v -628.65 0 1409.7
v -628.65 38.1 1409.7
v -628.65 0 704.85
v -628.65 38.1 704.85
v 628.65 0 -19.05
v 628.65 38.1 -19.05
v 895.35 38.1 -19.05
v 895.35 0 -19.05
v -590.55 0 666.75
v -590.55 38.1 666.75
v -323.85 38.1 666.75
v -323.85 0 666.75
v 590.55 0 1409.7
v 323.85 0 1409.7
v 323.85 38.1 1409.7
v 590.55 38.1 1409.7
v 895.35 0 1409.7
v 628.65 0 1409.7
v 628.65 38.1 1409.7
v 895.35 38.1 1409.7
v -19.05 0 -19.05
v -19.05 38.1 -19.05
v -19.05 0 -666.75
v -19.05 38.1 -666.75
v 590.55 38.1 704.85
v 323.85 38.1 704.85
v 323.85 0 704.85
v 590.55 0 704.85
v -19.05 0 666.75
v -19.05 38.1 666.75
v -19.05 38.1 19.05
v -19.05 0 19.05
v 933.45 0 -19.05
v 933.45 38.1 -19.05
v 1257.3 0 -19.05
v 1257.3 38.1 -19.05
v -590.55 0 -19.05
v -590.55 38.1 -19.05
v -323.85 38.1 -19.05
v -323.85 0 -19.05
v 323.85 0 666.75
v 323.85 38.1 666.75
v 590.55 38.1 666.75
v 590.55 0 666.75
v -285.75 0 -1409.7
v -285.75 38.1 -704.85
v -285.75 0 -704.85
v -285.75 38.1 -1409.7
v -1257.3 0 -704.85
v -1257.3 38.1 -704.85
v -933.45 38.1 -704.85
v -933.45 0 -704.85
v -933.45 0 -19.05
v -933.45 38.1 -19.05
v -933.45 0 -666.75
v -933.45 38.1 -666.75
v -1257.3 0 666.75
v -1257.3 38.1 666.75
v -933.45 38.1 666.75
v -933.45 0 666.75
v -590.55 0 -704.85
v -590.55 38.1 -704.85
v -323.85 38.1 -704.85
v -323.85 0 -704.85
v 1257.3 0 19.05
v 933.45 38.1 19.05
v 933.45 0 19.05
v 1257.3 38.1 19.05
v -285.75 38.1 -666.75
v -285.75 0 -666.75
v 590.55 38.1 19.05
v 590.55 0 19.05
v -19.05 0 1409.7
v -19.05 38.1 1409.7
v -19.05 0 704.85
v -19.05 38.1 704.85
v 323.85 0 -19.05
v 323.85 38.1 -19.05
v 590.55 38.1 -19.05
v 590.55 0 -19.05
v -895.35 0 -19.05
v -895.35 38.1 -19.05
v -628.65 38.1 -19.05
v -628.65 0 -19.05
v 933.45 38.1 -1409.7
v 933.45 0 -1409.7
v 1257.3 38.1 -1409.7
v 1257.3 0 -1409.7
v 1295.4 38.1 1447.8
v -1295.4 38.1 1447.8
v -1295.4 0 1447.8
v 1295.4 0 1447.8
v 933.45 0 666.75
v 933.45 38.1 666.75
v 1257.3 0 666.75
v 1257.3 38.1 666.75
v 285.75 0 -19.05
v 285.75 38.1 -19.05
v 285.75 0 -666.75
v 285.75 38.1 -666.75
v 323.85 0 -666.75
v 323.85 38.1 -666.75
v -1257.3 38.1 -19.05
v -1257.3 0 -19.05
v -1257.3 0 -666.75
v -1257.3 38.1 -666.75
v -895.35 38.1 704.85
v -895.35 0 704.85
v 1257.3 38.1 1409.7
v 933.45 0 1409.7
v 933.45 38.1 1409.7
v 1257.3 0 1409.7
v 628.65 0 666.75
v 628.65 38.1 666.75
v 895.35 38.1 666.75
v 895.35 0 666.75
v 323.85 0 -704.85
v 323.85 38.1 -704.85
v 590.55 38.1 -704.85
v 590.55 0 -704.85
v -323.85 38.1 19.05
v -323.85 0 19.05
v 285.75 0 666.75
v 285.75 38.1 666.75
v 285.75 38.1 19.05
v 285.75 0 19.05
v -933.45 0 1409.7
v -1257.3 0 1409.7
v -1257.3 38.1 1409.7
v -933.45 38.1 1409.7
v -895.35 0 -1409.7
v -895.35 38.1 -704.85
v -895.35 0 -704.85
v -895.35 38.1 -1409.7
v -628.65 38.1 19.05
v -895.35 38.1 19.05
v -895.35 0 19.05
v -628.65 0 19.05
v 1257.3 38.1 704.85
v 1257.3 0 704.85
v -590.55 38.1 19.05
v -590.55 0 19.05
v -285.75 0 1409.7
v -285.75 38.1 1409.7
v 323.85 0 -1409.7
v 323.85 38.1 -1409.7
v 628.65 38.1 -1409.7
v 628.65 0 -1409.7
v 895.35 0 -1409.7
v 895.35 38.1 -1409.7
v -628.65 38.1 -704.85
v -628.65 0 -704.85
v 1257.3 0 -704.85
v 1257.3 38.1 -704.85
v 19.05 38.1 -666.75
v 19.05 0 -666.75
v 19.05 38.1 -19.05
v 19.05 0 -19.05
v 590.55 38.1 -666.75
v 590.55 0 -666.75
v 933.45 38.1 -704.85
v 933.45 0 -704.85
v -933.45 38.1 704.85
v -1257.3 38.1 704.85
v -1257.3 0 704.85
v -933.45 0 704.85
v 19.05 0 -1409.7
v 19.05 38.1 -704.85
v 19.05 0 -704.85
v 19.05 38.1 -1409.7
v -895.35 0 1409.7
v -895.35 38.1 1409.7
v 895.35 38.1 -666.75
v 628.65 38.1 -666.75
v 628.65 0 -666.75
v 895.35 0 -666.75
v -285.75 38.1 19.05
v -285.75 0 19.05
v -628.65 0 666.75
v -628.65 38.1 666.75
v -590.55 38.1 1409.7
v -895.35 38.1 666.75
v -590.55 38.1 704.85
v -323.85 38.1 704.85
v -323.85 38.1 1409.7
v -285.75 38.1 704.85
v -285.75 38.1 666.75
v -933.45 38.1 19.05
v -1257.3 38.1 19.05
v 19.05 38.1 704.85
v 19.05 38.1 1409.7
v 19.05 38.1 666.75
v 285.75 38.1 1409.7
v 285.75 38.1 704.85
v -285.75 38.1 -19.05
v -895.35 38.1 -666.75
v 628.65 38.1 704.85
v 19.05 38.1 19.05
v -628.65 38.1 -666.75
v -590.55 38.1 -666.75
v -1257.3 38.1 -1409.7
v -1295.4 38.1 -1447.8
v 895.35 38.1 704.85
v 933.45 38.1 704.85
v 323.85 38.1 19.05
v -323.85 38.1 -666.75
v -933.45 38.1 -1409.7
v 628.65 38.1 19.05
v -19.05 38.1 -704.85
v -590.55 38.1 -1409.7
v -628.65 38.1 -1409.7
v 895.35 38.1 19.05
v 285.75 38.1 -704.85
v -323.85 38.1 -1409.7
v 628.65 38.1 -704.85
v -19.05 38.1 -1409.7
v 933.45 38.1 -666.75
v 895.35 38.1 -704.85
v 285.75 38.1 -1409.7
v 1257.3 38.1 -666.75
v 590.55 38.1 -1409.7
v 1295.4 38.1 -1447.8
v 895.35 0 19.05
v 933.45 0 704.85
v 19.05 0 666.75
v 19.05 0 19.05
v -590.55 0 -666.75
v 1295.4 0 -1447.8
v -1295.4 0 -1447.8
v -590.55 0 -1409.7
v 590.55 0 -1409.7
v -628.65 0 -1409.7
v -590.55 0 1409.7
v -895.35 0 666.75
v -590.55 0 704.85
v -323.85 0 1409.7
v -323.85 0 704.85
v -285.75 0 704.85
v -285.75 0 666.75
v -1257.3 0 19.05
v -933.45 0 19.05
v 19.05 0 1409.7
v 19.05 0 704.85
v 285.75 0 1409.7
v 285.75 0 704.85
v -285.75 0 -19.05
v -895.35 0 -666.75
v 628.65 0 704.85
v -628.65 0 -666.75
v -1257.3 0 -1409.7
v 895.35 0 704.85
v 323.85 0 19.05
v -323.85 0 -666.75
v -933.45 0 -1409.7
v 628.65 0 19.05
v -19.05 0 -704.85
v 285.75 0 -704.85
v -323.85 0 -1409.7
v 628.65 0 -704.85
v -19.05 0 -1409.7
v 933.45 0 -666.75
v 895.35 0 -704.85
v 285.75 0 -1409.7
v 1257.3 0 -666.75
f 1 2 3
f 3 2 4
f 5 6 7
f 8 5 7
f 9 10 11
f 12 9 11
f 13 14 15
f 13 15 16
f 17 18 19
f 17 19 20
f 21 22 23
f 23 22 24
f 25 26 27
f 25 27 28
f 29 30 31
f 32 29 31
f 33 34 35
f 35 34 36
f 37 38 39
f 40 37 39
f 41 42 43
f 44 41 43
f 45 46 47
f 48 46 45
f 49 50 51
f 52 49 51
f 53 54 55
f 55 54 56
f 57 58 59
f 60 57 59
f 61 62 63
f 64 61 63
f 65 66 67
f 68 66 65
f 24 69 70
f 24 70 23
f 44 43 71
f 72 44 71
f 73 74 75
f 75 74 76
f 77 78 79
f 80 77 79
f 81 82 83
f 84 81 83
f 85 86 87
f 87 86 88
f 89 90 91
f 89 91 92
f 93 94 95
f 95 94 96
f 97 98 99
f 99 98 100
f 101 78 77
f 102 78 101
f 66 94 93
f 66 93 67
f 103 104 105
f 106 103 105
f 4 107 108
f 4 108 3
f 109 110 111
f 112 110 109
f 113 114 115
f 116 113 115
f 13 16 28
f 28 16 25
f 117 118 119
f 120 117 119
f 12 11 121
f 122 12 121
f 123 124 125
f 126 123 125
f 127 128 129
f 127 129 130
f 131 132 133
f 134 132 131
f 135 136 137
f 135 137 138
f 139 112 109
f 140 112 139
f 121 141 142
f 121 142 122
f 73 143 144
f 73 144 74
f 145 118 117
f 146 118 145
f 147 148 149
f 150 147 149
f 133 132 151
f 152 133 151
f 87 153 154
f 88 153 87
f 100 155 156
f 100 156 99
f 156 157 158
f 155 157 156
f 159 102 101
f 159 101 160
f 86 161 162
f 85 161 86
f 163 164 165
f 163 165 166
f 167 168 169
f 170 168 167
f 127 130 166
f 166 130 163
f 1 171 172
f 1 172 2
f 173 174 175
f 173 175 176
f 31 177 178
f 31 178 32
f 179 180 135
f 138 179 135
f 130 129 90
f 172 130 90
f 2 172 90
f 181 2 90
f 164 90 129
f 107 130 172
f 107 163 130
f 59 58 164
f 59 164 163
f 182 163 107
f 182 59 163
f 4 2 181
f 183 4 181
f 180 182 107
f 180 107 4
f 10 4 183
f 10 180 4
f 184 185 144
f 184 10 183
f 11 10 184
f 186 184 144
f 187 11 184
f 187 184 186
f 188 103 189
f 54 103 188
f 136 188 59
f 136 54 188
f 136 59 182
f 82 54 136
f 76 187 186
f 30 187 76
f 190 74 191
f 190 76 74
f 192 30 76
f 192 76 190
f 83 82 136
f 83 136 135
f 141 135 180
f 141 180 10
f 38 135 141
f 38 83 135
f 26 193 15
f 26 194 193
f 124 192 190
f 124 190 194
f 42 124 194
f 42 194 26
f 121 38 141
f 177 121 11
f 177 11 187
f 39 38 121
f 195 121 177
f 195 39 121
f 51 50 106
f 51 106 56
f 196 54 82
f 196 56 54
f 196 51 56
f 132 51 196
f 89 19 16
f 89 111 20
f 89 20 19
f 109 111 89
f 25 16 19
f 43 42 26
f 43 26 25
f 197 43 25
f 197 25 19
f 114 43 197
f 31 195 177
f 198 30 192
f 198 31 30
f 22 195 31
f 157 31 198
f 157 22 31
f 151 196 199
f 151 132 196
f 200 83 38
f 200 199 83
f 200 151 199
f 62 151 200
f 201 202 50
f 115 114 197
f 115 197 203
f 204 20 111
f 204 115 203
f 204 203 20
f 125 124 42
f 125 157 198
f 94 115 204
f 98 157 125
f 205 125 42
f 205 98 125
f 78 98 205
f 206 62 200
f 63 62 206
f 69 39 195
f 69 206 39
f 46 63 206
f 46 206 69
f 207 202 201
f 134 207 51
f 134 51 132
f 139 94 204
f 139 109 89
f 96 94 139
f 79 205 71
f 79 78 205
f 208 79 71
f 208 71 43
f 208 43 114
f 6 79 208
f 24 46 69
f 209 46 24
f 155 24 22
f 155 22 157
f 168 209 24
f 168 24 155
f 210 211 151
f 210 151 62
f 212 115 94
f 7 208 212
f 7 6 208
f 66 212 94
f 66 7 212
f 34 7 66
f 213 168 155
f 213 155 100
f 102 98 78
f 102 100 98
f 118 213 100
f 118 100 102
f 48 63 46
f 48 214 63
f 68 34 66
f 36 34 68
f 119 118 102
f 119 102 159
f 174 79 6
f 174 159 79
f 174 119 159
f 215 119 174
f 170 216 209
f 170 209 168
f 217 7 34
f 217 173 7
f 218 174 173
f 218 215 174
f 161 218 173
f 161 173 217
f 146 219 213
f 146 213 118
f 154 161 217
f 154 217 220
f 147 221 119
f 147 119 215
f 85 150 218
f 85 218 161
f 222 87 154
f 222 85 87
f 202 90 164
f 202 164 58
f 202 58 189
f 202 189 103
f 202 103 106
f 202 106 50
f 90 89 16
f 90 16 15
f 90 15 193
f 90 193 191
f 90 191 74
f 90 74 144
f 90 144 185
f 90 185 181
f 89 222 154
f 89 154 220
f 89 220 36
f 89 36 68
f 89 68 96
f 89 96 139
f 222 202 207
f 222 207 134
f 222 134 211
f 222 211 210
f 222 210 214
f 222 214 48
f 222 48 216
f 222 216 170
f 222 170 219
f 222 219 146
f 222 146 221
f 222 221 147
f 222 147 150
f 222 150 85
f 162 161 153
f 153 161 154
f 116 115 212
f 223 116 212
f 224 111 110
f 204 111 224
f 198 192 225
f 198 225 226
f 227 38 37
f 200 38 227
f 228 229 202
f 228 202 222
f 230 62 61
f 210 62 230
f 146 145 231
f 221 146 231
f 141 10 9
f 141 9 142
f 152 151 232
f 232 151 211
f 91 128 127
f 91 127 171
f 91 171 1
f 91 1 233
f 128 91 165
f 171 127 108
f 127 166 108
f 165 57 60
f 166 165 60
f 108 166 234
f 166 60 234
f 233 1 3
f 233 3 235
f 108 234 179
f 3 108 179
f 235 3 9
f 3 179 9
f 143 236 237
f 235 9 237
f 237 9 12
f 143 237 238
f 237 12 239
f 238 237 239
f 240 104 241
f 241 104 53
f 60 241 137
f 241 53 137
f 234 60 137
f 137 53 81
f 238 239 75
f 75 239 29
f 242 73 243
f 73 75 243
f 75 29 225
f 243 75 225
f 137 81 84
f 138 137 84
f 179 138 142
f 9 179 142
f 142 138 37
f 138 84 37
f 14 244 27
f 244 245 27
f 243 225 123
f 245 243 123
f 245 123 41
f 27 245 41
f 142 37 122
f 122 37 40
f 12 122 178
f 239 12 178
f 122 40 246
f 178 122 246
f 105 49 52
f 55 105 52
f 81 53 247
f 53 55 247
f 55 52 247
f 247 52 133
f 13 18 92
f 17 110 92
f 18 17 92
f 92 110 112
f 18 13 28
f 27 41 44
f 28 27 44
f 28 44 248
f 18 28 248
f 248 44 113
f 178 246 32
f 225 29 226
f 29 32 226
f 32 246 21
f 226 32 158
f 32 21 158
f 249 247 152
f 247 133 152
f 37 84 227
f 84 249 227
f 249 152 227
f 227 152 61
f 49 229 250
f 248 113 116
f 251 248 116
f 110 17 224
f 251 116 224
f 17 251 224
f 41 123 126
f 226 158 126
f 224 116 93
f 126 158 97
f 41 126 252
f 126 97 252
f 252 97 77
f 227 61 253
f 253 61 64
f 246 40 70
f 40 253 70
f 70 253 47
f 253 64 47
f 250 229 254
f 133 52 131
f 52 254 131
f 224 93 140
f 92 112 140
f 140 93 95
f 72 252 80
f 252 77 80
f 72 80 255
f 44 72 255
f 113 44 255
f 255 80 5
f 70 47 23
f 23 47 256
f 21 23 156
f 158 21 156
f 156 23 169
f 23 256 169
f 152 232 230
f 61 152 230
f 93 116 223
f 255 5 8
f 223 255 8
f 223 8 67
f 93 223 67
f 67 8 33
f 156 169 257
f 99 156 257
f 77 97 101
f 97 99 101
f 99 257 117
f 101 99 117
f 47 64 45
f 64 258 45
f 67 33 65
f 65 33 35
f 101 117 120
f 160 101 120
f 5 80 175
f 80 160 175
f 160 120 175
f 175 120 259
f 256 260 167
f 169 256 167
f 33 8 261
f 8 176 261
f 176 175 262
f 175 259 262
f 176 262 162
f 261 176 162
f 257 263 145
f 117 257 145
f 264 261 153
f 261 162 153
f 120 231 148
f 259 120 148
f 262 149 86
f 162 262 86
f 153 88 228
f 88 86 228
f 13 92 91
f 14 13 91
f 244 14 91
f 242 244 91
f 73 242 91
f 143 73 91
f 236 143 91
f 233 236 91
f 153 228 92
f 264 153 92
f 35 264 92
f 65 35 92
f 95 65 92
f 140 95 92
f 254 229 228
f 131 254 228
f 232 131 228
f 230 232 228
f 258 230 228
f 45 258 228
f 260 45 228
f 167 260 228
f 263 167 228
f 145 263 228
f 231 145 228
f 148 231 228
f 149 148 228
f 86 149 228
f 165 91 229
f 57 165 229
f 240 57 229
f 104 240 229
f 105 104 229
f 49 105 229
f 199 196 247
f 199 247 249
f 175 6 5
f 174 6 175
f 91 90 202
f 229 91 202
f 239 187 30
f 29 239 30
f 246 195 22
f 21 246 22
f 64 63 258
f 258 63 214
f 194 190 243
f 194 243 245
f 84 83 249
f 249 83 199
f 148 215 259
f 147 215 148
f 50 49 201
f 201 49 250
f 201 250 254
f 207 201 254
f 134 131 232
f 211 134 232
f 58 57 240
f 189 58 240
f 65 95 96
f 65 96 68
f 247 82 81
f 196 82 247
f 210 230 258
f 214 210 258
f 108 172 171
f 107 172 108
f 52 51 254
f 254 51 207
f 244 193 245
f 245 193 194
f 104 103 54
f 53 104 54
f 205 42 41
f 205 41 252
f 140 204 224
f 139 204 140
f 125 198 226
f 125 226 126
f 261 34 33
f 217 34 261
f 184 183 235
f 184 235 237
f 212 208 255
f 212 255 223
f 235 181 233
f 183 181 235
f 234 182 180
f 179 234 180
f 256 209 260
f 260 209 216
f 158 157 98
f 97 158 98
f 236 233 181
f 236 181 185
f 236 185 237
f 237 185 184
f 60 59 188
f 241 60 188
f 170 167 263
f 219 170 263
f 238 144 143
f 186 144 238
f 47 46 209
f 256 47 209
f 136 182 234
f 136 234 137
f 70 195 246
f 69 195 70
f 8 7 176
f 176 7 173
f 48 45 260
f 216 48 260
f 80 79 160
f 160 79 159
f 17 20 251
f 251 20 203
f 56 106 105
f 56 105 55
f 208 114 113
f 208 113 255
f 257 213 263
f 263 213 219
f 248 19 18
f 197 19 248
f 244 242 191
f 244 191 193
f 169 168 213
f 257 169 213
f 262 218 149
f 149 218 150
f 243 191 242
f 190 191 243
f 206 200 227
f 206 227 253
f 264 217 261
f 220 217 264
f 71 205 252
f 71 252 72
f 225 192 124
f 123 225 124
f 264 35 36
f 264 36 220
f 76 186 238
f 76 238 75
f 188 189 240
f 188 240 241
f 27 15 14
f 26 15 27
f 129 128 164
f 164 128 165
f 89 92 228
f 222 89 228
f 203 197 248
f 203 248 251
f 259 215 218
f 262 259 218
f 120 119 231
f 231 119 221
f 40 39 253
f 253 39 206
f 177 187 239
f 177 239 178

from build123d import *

# Parameters (mm, degrees)
SKETCH1_W           = 2590.8
SKETCH1_H           = 2895.6
SKETCH1_W_2         = 2514.6
SKETCH1_H_2         = 2819.4
BOSS_EXTRUDE1_DEPTH = 38.1
SKETCH2_W           = 38.1
SKETCH2_H           = 2895.6
BOSS_EXTRUDE2_DEPTH = 38.1
LPATTERN1_COUNT     = 4
LPATTERN1_PITCH     = 304.8
LPATTERN2_COUNT     = 4
LPATTERN2_PITCH     = 304.8
SKETCH3_W           = 2590.8
SKETCH3_H           = 38.1
BOSS_EXTRUDE3_DEPTH = 38.1
LPATTERN3_COUNT     = 2
LPATTERN3_PITCH     = 685.8
LPATTERN4_COUNT     = 2
LPATTERN4_PITCH     = 685.8


with BuildPart() as part:
    # Sketch1 → Boss-Extrude1 (new body)
    with BuildSketch(Plane(origin=(0, 0, 0), x_dir=(1, 0, 0), z_dir=(0, 1, 0))):
        Rectangle(SKETCH1_W, SKETCH1_H)
        Rectangle(SKETCH1_W_2, SKETCH1_H_2, mode=Mode.SUBTRACT)
    extrude(amount=BOSS_EXTRUDE1_DEPTH)

    # Sketch2 → Boss-Extrude2 (add)
    with BuildSketch(Plane(origin=(0, 38.1, 0), x_dir=(1, 0, 0), z_dir=(0, 1, 0))):
        Rectangle(SKETCH2_W, SKETCH2_H)
    boss_extrude2 = extrude(amount=-BOSS_EXTRUDE2_DEPTH)

    # LPattern1: Boss-Extrude2 ×4
    with Locations(*[(-i * LPATTERN1_PITCH, 0, 0) for i in range(1, LPATTERN1_COUNT)]):
        add(boss_extrude2)

    # LPattern2: Boss-Extrude2 ×4
    with Locations(*[(i * LPATTERN2_PITCH, 0, 0) for i in range(1, LPATTERN2_COUNT)]):
        add(boss_extrude2)

    # Sketch3 → Boss-Extrude3 (add)
    with BuildSketch(Plane(origin=(0, 38.1, 0), x_dir=(1, 0, 0), z_dir=(0, 1, 0))):
        Rectangle(SKETCH3_W, SKETCH3_H)
    boss_extrude3 = extrude(amount=-BOSS_EXTRUDE3_DEPTH)

    # LPattern3: Boss-Extrude3 ×2
    with Locations(*[(0, 0, i * LPATTERN3_PITCH) for i in range(1, LPATTERN3_COUNT)]):
        add(boss_extrude3)

    # LPattern4: Boss-Extrude3 ×2
    with Locations(*[(0, 0, -i * LPATTERN4_PITCH) for i in range(1, LPATTERN4_COUNT)]):
        add(boss_extrude3)


solid = part.part
